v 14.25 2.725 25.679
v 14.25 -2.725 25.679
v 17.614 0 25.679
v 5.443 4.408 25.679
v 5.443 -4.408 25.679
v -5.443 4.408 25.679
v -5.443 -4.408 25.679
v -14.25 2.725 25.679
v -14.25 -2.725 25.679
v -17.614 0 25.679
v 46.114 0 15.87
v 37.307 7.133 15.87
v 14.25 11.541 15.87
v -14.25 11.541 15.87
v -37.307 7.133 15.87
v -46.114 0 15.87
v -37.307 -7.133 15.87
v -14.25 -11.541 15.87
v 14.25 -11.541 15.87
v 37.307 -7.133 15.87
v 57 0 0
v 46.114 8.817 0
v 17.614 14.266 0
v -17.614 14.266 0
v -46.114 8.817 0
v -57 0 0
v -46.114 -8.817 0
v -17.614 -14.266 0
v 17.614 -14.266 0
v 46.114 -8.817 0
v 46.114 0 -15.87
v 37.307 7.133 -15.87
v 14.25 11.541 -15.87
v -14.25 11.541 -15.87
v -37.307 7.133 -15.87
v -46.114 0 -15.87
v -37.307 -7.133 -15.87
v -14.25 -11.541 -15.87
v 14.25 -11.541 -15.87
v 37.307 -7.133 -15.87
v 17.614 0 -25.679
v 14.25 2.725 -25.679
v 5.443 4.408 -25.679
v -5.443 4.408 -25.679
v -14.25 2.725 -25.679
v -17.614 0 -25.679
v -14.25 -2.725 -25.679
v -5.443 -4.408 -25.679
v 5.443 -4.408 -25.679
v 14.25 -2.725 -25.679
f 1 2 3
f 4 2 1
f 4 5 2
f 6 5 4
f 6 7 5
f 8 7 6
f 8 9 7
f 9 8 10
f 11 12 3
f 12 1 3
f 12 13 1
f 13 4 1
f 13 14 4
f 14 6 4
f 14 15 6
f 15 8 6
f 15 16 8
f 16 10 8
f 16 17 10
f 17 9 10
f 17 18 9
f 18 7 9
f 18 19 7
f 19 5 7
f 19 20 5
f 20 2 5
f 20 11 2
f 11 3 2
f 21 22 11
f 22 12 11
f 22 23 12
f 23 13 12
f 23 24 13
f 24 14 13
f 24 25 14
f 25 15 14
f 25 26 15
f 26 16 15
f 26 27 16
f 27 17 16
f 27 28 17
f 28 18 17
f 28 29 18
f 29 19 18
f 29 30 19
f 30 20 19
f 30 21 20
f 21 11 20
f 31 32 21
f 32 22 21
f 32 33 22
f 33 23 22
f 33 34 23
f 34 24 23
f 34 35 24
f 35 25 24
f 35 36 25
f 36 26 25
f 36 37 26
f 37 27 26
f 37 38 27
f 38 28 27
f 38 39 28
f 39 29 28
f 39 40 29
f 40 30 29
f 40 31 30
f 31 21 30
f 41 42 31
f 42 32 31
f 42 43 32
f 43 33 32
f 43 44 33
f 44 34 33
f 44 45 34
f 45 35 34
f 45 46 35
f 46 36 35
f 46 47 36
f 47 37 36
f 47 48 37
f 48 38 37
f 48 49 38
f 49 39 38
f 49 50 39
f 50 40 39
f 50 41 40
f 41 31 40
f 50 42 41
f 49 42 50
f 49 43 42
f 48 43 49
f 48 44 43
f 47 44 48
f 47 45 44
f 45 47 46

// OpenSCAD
// Generated by SolidPython 1.0.1 on 2020-07-29 00:46:53


scale(v = [19, 5, 9]) {
	sphere(r = 3);
}
/***********************************************
*********      SolidPython code:      **********
************************************************
 
# import packages: SolidPython
from solid import *
from solid.utils import *
from itertools import chain, combinations, permutations


class Resize:

    def __init__(self, scad_file):
        self.scad_file = scad_file
        #self.scad_file = import_scad(scad_file)
        # cone/cylinder param:
        self.r1 = 0
        self.r2 = 0
        self.h = 0
        # rectangular prism param:
        self.w = 0
        self.l = 0
        # ellipse param:
        self.r = 0

    # import OpenScad code (file name corresponds to shape)


    # classify shape + parameters
    def assign(self, param1, param2, param3):
        if self.scad_file == 'cone.scad':
            self.r1 = param1
            self.r2 = param2
            self.h = param3
        elif self.scad_file == 'cylinder.scad':
            self.r1 = param1
            self.r2 = param2
            self.h = param3
        elif self.scad_file == 'rectangularPrism.scad':
            self.h = param1
            self.l = param2
            self.w = param3
        else:
            self.r = param1
            self.h = param2

    # resize parameters
    def iterate(self):
        x = range(3, 20, 2)
        i = 1
        if self.scad_file == 'cone.scad':
            tempList = list(permutations(x, 2))
            for temp in tempList:
                param1 = temp[0]
                param2 = temp[1]
                filepath = 'produced_scad_files/' + 'cone' + str(param1) + '_' + str(param2) + '_' + '.scad'
                scad_render_to_file(cylinder(h=param1, r1=param2, r2=0), filepath)

        elif self.scad_file == 'cylinder.scad':
            tempList = list(permutations(x, 3))
            for temp in tempList:
                param1 = temp[0]
                param2 = temp[1]
                filepath = 'produced_scad_files/' + 'cylinder' + str(param1) + '_' + str(param2) + '_' + '.scad'
                scad_render_to_file(cylinder(h=param1, r1=param2, r2=param2), filepath)

        elif self.scad_file == 'rectangularPrism.scad':
            tempList = list(permutations(x, 3))
            for temp in tempList:
                param1 = temp[0]
                param2 = temp[1]
                param3 = temp[2]
                filepath = 'produced_scad_files/' + 'rectangularPrism' + str(param1) + '_' + str(param2) + '_' + str(
                    param3) + '.scad'
                scad_render_to_file(cube(size=(param1, param2, param3)), filepath)

        elif self.scad_file == 'ellipse.scad':
            tempList = list(permutations(x, 4))
            for temp in tempList:
                param1 = temp[0]
                param2 = temp[1]
                param3 = temp[2]
                param4 = temp[3]
                filepath = 'produced_scad_files/' + 'ellipse' + str(param1) + '_' + str(param2) + '_' + str(param3) + '_' + str(param4) + '.scad'
                scad_render_to_file(scale([param1, param2, param3])(sphere(r=param4)), filepath)

    def render_to_scadfile(self):
        scad_render_to_file(scad, 'example.scad') 
 
************************************************/
